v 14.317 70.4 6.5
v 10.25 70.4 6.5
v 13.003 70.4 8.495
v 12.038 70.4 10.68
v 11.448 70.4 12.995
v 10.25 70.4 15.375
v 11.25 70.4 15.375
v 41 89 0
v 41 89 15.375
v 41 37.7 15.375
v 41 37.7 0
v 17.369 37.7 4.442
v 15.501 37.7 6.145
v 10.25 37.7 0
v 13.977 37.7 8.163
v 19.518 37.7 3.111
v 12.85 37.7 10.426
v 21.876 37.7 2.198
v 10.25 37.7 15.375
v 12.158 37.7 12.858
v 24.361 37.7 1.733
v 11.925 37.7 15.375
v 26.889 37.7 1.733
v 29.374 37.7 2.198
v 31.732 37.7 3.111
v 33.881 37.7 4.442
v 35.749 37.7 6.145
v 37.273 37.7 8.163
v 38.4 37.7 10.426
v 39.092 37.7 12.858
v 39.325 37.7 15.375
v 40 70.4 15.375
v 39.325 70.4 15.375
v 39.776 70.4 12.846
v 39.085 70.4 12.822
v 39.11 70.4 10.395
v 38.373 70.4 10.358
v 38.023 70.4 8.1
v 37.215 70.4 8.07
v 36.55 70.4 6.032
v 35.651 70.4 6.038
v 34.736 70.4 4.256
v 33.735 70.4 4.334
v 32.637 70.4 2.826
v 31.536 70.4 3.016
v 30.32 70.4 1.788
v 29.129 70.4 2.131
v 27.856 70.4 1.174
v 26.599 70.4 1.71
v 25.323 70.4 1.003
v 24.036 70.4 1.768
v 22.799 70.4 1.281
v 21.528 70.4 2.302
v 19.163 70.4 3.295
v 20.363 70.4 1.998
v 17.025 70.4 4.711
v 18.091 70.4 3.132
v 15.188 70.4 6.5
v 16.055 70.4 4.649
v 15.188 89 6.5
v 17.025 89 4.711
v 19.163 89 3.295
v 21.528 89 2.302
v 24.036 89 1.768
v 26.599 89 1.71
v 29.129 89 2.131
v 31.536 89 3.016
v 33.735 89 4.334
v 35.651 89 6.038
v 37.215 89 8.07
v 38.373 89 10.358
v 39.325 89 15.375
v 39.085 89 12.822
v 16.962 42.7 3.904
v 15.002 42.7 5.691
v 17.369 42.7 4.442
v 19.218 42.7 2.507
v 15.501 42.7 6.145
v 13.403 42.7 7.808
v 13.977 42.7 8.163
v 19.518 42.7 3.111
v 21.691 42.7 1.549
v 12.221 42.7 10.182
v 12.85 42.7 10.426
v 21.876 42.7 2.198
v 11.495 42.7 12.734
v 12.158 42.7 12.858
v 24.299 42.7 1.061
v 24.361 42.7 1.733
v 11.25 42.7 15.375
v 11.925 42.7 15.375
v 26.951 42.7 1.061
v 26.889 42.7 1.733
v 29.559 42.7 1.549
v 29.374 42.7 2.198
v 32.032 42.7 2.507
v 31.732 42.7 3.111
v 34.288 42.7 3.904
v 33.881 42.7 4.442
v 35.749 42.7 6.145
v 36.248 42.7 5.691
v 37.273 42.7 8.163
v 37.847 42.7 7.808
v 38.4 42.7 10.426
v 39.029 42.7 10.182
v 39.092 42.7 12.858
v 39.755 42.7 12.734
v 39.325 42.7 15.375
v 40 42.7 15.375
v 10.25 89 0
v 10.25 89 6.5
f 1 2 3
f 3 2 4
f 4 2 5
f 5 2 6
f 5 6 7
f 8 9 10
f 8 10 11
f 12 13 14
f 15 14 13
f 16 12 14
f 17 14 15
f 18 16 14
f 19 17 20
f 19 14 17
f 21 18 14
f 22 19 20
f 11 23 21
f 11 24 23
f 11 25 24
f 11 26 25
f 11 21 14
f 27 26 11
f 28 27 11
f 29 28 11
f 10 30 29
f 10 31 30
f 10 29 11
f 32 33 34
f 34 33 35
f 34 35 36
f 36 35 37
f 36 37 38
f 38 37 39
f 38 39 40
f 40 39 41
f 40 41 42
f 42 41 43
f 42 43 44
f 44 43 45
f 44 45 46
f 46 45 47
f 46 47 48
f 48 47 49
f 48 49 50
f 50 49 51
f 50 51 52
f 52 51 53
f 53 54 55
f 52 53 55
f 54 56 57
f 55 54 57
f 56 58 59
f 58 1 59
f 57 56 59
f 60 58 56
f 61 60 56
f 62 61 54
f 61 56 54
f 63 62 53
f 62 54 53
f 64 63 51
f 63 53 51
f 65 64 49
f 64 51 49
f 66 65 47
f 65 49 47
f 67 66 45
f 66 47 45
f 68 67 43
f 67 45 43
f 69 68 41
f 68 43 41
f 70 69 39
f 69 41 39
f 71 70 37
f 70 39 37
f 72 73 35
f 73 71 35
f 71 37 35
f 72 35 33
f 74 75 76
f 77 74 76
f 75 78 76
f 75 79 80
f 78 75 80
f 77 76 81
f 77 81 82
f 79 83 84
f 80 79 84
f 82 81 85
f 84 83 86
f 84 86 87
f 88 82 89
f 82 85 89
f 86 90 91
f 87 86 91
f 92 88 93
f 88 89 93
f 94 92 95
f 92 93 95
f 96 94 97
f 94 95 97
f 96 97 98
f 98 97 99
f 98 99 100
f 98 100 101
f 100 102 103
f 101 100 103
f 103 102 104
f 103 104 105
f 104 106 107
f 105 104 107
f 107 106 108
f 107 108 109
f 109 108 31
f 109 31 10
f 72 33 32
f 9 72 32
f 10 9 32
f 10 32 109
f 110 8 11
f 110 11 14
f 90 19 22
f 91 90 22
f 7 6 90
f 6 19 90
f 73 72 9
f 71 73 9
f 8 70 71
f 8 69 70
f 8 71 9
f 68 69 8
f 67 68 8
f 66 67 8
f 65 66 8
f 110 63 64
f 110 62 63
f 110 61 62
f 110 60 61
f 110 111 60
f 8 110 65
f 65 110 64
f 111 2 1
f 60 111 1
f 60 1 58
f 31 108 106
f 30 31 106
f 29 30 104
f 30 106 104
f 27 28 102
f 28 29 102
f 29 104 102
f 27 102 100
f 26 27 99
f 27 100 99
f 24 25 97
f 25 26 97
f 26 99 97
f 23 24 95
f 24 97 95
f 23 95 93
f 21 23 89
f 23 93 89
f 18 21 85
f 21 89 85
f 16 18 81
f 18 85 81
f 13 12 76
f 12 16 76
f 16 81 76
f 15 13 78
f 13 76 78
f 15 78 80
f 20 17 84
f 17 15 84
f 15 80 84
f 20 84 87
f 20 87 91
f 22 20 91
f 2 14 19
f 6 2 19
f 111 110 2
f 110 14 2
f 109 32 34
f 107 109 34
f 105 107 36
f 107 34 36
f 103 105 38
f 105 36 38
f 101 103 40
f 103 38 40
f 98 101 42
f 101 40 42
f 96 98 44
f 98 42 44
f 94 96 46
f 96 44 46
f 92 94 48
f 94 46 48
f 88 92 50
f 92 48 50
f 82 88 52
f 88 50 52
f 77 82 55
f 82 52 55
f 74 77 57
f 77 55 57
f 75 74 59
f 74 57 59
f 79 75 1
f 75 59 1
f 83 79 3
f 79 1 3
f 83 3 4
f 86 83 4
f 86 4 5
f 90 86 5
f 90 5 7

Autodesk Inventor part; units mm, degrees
ref_plane "Work Plane1" through (25.625, 84.2, 15.375) normal (0, 1, 0) x (0, 0, -1)
sketch "Sketch1" plane through (25.625, 84.2, 15.375) normal (0, 1, 0) x (0, 0, -1)
  line L0 (11.5, -1.5) -> (11, -1.5) projected
  line L1 (11, -1.5) -> (11, 1.5) projected
  line L2 (11, 1.5) -> (11.5, 1.5) projected
  line L3 (11.5, 1.5) -> (11.5, -1.5) projected
  line L4 (-12, -1.5) -> (-12, 1.5) projected
  line L5 (-12, 1.5) -> (-11.5, 1.5) projected
  line L6 (-11.5, 1.5) -> (-11.5, -1.5) projected
  line L7 (-11.5, -1.5) -> (-12, -1.5) projected
  circle A0 centre (0, 0) radius 5 projected
  circle A1 centre (0, 0) radius 13.7 projected
  line L8 (18.875, -15.375) -> (18.875, 116.625) projected
  line L9 (18.875, 116.625) -> (15.375, 116.625) projected
  line L10 (15.375, -15.375) -> (15.375, 116.625) projected
  line L11 (18.875, -15.375) -> (15.375, -15.375) projected
  line L12 (15.375, -15.375) -> (0, -15.375)
  line L13 (0, -15.375) -> (0, 15.375)
  line L14 (0, 15.375) -> (15.375, 15.375)
  line L15 (15.375, 15.375) -> (15.375, -15.375)
  circle A2 centre (12.125, 12.125) radius 3.25
  circle A3 centre (12.125, -12.125) radius 3.25
  line L16 (8.875, 15.375) -> (8.875, 10.4367)
  point P0 (15.375, 25.625)
  point P1 (0, -13.7)
  dimension "d2" = 15.375
  dimension "d3" = 15.375
  dimension "d4" = 6.5
  dimension "d5" = 6.5
ref_plane "Work Plane2" through (11.25, 70.4, 1) normal (0, 1, 0) x (0, 0, 1)
extrude "Extrusion1" add sketch "Sketch1" along normal blind 4.8 and the other way blind 13.8 contours A1 L16 A2 L10 A3 L12 L13 | L16 L14 A2 | A2 | A3 L10 L12 | A3 | L14 L10 A2
sketch "Sketch2" plane through (25.625, 70.4, 15.375) normal (0, -1, 0) x (1, 0, 0)
  arc A0 (-3.651, 5.9062) -> (-4.7619, 7.7035) centre (-4.2064, 6.8048) ccw projected
  arc A1 (-3.651, 5.9062) -> (-6.4477, 2.5768) centre (0, 0) ccw projected
  arc A2 (-8.4097, 3.3608) -> (-6.4477, 2.5768) centre (-7.4287, 2.9688) ccw projected
  arc A3 (-4.7619, 7.7035) -> (-8.4097, 3.3608) centre (0, 0) ccw projected
  arc A4 (6.4477, 2.5768) -> (8.4097, 3.3608) centre (7.4287, 2.9688) ccw projected
  arc A5 (6.4477, 2.5768) -> (3.651, 5.9062) centre (0, 0) ccw projected
  arc A6 (4.7619, 7.7035) -> (3.651, 5.9062) centre (4.2064, 6.8048) ccw projected
  arc A7 (8.4097, 3.3608) -> (4.7619, 7.7035) centre (0, 0) ccw projected
  arc A8 (-6.4563, -2.5553) -> (-8.4209, -3.3328) centre (-7.4386, -2.9441) ccw projected
  arc A9 (-6.4563, -2.5553) -> (-3.651, -5.9062) centre (0, 0) ccw projected
  arc A10 (-4.7619, -7.7035) -> (-3.651, -5.9062) centre (-4.2064, -6.8048) ccw projected
  arc A11 (-8.4209, -3.3328) -> (-4.7619, -7.7035) centre (0, 0) ccw projected
  arc A12 (3.651, -5.9062) -> (4.7619, -7.7035) centre (4.2064, -6.8048) ccw projected
  arc A13 (3.651, -5.9062) -> (6.4563, -2.5553) centre (0, 0) ccw projected
  arc A14 (8.4209, -3.3328) -> (6.4563, -2.5553) centre (7.4386, -2.9441) ccw projected
  arc A15 (4.7619, -7.7035) -> (8.4209, -3.3328) centre (0, 0) ccw projected
  circle A16 centre (10.65, 0.0124) radius 1.15 projected
  circle A17 centre (0, 8) radius 1.0564 projected
  circle A18 centre (0, -8) radius 1.0564 projected
  circle A19 centre (0, 0) radius 5 projected
  circle A20 centre (0, 0) radius 13.7 projected
  line L0 (15.375, -18.875) -> (-116.625, -18.875) projected
  line L1 (-116.625, -18.875) -> (-116.625, -15.375) projected
  line L2 (15.375, -15.375) -> (-116.625, -15.375) projected
  line L3 (15.375, -18.875) -> (15.375, -15.375) projected
  line L4 (15.375, -15.375) -> (-15.375, -15.375)
  line L5 (-15.375, -15.375) -> (-15.375, 0)
  line L6 (-15.375, 0) -> (15.375, 0)
  line L7 (15.375, 0) -> (15.375, -15.375)
  circle A21 centre (0, 0) radius 14.375
  point P0 (-25.625, -15.375)
  point P1 (13.7, 0)
  point P2 (-13.7, 0)
  point P3 (-15.375, -15.375)
  point P4 (14.375, 0)
  point P5 (-14.375, 0)
  dimension "d10" = 15.375
  dimension "d11" = 15.375
ref_plane "Work Plane3" through (11.25, 42.7, 1) normal (0, -1, 0) x (1, 0, 0)
extrude "Extrusion2" add sketch "Sketch2" along normal up to surface (27.7 mm away) contours L6 L7 L2 L5 A21
sketch "Sketch3" plane through (25.625, 42.7, 15.375) normal (0, -1, 0) x (1, 0, 0)
  arc A0 (-3.651, 5.9062) -> (-4.7619, 7.7035) centre (-4.2064, 6.8048) ccw projected
  arc A1 (-3.651, 5.9062) -> (-6.4477, 2.5768) centre (0, 0) ccw projected
  arc A2 (-8.4097, 3.3608) -> (-6.4477, 2.5768) centre (-7.4287, 2.9688) ccw projected
  arc A3 (-4.7619, 7.7035) -> (-8.4097, 3.3608) centre (0, 0) ccw projected
  arc A4 (6.4477, 2.5768) -> (8.4097, 3.3608) centre (7.4287, 2.9688) ccw projected
  arc A5 (6.4477, 2.5768) -> (3.651, 5.9062) centre (0, 0) ccw projected
  arc A6 (4.7619, 7.7035) -> (3.651, 5.9062) centre (4.2064, 6.8048) ccw projected
  arc A7 (8.4097, 3.3608) -> (4.7619, 7.7035) centre (0, 0) ccw projected
  arc A8 (-6.4563, -2.5553) -> (-8.4209, -3.3328) centre (-7.4386, -2.9441) ccw projected
  arc A9 (-6.4563, -2.5553) -> (-3.651, -5.9062) centre (0, 0) ccw projected
  arc A10 (-4.7619, -7.7035) -> (-3.651, -5.9062) centre (-4.2064, -6.8048) ccw projected
  arc A11 (-8.4209, -3.3328) -> (-4.7619, -7.7035) centre (0, 0) ccw projected
  arc A12 (3.651, -5.9062) -> (4.7619, -7.7035) centre (4.2064, -6.8048) ccw projected
  arc A13 (3.651, -5.9062) -> (6.4563, -2.5553) centre (0, 0) ccw projected
  arc A14 (8.4209, -3.3328) -> (6.4563, -2.5553) centre (7.4386, -2.9441) ccw projected
  arc A15 (4.7619, -7.7035) -> (8.4209, -3.3328) centre (0, 0) ccw projected
  circle A16 centre (10.65, 0.0124) radius 1.15 projected
  circle A17 centre (0, 8) radius 1.0564 projected
  circle A18 centre (0, -8) radius 1.0564 projected
  circle A19 centre (0, 0) radius 5 projected
  circle A20 centre (0, 0) radius 13.7 projected
  line L0 (15.375, -18.875) -> (-116.625, -18.875) projected
  line L1 (-116.625, -18.875) -> (-116.625, -15.375) projected
  line L2 (15.375, -15.375) -> (-116.625, -15.375) projected
  line L3 (15.375, -18.875) -> (15.375, -15.375) projected
  line L4 (15.375, 0) -> (15.375, -15.375) projected
  line L5 (15.375, -15.375) -> (-15.375, -15.375)
  line L6 (-15.375, -15.375) -> (-15.375, 0)
  line L7 (-15.375, 0) -> (15.375, 0)
  line L8 (15.375, 0) -> (15.375, -15.375)
  point P0 (-25.625, -15.375)
  point P1 (15.375, 0)
  point P2 (13.7, 0)
  point P3 (-13.7, 0)
  point P4 (-15.375, -15.375)
  dimension "d14" = 15.375
  dimension "d15" = 15.375
ref_plane "Work Plane4" through (11.925, 37.7, 1.675) normal (0, -1, 0) x (1, 0, 0)
extrude "Extrusion3" add sketch "Sketch3" along normal up to surface (5 mm away) contours L7 L4 L2 L6 A20
equation "\"d3\" = d2"
equation "\"d11\" = d10"
equation "\"d15\" = d14"
properties part number "motur_holder"
